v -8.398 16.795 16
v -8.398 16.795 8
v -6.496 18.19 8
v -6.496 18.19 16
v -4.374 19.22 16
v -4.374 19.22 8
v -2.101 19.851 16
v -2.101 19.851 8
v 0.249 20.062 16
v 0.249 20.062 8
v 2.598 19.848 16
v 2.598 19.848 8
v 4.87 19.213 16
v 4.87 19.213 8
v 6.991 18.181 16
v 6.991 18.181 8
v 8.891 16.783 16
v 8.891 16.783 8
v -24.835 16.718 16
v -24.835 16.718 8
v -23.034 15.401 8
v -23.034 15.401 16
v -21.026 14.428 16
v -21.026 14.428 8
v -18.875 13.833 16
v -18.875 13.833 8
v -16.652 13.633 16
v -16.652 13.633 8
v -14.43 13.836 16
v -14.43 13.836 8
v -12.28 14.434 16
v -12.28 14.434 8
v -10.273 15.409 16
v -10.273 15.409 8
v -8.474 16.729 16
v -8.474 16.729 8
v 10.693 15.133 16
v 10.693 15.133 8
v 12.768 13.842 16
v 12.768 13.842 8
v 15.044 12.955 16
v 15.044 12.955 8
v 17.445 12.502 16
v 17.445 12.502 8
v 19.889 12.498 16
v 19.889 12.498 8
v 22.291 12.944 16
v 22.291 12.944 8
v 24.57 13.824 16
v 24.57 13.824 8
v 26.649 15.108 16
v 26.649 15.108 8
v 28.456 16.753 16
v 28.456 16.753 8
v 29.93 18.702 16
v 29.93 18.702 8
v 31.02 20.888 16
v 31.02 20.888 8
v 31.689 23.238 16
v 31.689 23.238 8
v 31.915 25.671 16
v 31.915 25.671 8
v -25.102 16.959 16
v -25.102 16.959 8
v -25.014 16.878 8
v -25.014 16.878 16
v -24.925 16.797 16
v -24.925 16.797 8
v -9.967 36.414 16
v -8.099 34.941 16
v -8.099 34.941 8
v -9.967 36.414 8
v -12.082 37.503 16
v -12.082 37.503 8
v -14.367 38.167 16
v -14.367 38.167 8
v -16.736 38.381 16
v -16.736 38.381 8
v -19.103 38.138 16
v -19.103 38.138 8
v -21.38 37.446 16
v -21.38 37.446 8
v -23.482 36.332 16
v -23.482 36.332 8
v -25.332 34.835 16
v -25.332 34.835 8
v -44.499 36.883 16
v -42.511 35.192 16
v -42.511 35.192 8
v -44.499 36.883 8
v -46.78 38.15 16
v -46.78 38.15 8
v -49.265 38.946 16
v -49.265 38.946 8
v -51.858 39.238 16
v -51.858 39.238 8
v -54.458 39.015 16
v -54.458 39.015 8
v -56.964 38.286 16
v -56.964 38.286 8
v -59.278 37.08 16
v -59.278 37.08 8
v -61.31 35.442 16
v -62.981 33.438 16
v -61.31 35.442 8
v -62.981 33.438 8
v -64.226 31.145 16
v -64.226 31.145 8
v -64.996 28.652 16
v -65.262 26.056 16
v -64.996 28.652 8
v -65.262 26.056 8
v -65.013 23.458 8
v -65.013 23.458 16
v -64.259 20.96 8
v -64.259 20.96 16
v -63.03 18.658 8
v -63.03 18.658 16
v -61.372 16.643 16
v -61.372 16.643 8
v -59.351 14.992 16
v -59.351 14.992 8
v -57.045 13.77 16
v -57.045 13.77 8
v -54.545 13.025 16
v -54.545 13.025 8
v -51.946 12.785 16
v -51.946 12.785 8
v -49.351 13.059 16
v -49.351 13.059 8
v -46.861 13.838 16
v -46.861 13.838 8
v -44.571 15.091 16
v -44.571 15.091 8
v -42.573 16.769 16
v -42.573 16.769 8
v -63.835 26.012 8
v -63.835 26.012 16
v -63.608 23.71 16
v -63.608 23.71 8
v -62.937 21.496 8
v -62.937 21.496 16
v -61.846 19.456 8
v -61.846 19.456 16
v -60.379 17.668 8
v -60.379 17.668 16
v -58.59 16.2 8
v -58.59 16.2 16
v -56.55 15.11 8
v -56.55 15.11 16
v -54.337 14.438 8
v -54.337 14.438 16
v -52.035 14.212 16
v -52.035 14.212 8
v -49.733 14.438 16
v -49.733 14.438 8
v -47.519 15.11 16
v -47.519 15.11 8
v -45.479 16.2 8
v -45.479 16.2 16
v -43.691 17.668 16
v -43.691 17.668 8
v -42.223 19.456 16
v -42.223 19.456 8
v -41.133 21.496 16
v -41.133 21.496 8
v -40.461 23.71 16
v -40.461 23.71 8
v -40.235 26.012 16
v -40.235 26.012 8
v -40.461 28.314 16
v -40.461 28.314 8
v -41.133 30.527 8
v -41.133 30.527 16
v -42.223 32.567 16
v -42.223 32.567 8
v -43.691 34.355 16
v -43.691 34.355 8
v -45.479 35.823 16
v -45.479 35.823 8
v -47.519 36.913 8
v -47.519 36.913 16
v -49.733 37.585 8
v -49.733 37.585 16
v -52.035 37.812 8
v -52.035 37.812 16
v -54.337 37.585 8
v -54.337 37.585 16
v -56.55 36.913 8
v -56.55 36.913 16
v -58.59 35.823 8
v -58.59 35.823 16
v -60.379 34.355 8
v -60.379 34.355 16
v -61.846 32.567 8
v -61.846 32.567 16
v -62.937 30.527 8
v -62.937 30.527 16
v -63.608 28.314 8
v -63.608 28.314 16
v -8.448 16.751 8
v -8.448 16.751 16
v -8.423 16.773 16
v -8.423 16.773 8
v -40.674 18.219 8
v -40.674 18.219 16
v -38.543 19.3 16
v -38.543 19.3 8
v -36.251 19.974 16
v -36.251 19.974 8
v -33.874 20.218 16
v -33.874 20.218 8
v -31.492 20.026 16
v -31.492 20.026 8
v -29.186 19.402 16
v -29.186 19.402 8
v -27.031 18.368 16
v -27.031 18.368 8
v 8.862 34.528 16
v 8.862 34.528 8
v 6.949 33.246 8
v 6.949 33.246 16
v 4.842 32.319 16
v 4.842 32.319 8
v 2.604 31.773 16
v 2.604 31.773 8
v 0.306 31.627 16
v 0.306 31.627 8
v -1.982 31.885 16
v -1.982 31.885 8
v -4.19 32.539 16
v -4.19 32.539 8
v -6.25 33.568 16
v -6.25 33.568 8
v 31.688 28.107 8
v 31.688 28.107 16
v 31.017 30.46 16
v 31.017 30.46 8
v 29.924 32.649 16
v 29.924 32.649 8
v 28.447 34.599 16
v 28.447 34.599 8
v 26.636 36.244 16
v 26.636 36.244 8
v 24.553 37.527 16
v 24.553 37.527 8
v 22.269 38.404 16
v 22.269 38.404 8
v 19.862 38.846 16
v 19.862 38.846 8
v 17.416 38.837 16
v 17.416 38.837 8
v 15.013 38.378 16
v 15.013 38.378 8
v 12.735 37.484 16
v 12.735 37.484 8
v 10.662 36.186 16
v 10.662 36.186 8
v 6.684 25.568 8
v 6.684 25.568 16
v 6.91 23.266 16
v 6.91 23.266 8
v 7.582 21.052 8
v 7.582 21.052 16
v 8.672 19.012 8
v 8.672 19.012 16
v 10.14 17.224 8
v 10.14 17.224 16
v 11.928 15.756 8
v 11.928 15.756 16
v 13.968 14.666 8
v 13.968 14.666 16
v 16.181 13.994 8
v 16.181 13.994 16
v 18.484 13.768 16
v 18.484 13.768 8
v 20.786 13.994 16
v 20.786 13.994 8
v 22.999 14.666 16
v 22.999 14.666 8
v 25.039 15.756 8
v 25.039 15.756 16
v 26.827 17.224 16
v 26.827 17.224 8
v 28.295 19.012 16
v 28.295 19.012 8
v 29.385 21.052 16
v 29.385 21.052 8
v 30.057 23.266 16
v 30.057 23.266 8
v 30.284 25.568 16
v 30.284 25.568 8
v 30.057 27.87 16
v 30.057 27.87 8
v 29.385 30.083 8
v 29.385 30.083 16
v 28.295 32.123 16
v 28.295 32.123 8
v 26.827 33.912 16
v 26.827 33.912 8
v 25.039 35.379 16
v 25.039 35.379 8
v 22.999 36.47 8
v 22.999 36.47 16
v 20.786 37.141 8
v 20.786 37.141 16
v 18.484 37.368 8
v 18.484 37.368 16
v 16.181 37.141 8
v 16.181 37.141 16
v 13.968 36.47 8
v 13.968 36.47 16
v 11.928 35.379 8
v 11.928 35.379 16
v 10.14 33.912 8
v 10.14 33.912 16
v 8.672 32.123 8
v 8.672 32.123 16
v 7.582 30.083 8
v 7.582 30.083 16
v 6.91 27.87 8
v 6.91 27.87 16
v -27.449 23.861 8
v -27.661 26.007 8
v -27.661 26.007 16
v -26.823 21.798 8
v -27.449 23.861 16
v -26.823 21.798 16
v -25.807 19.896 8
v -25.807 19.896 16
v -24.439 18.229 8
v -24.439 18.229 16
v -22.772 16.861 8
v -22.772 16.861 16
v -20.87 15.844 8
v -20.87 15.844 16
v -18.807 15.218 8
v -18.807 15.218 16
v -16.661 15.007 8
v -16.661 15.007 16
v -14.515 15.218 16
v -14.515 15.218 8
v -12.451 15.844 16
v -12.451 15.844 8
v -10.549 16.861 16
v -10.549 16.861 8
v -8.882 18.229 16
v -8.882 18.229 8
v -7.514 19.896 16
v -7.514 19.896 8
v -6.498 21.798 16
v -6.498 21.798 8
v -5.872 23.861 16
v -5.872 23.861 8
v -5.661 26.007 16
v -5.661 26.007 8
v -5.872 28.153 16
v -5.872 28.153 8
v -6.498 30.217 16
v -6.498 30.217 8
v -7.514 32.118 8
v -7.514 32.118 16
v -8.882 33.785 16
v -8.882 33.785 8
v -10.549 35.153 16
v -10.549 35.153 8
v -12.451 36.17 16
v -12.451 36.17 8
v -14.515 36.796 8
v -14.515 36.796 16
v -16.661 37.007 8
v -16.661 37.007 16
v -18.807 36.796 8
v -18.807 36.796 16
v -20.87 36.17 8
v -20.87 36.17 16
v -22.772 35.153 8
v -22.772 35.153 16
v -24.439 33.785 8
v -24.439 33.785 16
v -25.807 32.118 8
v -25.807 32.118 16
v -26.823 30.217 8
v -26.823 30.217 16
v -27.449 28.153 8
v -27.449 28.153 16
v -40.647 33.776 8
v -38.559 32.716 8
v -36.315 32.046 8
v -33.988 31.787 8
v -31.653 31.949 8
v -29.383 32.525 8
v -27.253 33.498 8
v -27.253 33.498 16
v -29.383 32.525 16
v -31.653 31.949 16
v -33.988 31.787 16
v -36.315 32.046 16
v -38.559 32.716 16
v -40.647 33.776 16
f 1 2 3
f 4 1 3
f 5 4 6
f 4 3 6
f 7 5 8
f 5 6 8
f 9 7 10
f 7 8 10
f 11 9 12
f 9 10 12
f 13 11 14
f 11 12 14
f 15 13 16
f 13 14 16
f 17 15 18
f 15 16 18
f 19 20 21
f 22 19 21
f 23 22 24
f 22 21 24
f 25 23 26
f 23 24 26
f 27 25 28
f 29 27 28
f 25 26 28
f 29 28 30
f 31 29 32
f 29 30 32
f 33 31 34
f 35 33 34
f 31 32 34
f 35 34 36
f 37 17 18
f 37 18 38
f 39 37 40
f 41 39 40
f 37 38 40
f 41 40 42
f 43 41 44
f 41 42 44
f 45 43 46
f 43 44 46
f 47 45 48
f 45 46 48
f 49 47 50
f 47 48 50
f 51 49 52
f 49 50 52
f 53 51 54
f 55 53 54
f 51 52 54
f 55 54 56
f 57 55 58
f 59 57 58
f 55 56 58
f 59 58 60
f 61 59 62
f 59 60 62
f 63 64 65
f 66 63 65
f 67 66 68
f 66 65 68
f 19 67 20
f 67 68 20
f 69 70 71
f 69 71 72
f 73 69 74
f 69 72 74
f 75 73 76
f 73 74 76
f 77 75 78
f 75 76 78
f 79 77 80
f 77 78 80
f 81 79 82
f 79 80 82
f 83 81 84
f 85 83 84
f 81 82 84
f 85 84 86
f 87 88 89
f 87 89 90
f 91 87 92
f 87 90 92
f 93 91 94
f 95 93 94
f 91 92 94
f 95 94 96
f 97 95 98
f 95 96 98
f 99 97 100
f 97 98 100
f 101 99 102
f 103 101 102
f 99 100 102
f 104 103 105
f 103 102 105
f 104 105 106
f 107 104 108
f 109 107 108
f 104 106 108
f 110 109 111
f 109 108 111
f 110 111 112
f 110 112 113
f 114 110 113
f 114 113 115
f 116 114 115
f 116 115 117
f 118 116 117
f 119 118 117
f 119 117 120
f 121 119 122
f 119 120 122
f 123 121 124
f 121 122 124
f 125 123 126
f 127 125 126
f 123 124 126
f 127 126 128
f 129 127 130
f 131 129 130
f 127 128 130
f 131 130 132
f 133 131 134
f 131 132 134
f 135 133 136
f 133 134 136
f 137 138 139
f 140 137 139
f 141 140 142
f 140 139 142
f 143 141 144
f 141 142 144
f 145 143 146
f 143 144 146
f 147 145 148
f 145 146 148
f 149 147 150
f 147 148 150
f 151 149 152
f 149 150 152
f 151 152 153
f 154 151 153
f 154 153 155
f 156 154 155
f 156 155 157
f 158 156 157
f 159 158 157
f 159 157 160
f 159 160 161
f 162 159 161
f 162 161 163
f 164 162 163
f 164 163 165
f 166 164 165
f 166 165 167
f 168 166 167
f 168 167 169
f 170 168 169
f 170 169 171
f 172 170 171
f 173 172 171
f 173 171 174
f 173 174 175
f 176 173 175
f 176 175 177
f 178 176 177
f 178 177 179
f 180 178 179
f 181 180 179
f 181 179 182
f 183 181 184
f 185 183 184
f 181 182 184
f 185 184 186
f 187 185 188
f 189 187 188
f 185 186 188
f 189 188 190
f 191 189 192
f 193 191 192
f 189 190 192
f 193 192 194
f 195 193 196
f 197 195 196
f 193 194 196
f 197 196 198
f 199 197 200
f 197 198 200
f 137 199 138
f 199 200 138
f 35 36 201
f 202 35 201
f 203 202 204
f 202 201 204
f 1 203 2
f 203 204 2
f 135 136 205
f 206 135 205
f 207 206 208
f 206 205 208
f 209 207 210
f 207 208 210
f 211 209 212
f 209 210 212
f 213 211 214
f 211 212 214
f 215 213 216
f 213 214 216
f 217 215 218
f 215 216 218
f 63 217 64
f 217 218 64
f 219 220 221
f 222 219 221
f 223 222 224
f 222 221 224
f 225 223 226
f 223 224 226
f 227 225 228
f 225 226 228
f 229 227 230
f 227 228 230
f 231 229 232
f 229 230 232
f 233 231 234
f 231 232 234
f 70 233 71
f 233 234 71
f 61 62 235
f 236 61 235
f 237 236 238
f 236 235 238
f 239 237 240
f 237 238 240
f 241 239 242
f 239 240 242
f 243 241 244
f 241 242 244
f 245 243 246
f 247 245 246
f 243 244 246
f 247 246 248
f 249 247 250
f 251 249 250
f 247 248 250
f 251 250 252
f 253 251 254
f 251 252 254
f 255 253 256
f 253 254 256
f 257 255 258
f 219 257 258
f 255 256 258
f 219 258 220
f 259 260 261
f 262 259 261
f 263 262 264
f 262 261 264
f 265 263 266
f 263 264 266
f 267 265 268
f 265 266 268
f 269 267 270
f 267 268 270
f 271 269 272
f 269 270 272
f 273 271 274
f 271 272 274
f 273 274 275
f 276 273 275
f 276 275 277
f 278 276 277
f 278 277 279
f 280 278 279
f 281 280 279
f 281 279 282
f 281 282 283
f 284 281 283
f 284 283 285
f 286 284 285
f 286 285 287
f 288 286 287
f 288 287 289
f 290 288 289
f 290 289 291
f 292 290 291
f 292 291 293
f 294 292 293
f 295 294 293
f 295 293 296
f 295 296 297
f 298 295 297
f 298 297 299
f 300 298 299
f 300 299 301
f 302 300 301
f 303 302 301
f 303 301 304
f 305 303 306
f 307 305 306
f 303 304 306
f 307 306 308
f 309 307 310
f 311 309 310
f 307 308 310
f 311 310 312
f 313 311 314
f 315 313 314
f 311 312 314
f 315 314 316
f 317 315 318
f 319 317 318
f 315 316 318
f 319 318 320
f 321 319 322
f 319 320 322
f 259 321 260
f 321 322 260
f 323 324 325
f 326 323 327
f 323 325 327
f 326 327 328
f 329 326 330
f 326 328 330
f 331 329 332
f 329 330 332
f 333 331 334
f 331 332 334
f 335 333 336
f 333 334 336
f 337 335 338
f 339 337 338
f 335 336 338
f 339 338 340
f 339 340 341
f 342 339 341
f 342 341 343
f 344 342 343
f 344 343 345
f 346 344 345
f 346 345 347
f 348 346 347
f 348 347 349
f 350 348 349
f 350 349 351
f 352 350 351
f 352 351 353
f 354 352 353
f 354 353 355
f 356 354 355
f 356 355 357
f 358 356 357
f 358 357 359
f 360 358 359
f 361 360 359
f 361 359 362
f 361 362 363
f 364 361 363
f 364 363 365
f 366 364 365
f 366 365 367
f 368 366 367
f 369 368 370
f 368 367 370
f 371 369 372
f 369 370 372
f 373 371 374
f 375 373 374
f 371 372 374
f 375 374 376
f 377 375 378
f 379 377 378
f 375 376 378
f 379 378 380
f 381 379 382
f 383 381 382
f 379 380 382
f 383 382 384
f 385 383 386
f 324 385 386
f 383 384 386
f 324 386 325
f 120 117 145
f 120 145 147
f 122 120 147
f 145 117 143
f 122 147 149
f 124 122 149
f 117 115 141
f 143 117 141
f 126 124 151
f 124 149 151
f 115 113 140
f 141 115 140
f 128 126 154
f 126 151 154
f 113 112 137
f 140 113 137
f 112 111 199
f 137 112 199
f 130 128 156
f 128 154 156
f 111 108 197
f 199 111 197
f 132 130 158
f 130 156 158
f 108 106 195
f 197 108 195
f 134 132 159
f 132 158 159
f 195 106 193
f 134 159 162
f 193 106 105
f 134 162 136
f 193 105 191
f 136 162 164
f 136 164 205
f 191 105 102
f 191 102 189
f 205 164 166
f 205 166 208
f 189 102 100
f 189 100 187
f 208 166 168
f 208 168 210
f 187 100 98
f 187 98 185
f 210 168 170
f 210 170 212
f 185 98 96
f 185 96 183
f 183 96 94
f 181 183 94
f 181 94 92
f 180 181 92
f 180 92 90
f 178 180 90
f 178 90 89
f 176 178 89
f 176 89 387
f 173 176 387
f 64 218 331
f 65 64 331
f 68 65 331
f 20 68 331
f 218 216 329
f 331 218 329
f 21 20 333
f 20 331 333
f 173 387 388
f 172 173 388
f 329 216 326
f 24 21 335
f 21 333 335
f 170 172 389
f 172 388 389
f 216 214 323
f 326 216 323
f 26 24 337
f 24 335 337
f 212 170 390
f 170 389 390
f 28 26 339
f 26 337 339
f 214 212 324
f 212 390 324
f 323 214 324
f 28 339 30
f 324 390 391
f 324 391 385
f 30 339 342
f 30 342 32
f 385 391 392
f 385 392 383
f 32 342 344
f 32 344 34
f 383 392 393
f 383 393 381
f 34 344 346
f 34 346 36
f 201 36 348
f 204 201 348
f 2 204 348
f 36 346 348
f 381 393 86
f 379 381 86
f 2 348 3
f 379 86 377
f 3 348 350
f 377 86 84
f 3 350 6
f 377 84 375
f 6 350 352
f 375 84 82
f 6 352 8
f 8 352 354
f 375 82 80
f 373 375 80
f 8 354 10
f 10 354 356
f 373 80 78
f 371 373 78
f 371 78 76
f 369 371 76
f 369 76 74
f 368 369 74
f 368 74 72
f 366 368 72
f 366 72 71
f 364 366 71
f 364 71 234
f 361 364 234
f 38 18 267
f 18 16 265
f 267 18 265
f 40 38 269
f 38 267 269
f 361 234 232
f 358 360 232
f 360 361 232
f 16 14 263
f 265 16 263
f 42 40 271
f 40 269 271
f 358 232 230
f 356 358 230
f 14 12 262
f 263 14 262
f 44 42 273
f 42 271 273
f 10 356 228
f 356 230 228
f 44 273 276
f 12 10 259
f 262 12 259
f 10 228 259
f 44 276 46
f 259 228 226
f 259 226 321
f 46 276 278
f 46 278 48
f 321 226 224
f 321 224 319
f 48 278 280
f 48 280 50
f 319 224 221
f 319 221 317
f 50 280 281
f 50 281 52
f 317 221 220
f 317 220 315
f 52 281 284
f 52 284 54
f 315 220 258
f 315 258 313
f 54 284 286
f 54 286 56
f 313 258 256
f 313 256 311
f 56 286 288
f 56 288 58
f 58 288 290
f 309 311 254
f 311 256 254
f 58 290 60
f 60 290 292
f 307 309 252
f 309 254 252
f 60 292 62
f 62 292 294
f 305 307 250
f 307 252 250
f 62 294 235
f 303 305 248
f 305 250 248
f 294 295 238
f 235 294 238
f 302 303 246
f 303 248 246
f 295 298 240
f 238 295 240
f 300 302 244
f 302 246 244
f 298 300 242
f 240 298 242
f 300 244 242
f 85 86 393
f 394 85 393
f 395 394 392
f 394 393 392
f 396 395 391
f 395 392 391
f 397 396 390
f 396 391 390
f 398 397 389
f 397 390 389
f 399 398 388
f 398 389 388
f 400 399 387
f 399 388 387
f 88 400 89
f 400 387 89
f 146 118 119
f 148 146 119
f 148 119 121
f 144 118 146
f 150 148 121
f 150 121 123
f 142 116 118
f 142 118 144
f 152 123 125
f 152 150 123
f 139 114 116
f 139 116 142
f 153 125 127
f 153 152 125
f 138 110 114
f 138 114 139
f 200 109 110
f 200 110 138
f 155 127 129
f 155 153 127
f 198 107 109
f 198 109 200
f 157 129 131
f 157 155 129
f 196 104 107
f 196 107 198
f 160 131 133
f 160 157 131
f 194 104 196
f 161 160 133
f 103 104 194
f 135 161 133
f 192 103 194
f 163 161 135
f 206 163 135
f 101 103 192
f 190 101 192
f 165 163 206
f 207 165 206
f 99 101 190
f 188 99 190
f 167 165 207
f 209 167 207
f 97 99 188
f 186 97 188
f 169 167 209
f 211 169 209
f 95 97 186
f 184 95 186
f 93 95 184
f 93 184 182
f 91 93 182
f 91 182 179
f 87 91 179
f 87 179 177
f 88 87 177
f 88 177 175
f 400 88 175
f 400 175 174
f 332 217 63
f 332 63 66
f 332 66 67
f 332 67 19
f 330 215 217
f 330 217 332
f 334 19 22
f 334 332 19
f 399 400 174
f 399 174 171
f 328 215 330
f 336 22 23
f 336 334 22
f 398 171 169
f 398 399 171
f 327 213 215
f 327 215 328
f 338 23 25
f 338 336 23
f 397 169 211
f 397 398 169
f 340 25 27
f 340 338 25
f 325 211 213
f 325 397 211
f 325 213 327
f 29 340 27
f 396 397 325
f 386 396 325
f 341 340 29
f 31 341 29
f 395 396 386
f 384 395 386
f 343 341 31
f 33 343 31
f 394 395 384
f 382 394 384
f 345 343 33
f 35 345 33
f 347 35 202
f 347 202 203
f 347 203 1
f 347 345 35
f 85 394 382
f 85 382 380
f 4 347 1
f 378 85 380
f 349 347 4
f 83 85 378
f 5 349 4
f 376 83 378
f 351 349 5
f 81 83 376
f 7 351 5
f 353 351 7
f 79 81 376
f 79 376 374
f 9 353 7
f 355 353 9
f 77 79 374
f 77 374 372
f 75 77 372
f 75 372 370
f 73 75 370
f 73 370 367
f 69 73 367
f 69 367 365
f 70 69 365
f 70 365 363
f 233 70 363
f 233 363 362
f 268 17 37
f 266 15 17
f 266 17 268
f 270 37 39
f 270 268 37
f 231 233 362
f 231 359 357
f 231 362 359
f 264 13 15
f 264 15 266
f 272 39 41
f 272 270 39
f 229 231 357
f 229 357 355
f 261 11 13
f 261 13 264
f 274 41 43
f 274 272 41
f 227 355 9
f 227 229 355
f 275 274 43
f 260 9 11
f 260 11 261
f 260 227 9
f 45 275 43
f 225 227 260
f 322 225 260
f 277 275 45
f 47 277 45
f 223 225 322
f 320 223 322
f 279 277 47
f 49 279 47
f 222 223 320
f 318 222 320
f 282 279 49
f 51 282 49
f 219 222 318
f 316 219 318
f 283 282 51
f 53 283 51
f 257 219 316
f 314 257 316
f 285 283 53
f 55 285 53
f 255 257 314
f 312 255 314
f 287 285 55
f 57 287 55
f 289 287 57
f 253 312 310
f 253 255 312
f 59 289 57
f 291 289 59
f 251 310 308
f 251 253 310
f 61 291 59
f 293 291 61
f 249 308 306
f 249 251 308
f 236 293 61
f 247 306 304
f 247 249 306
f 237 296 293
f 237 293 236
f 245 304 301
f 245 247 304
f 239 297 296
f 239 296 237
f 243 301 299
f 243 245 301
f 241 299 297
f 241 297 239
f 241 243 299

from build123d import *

# Parameters (mm, degrees)
F1_DEPTH = 8
F3_DEPTH = 8
F4_D     = 23.6
F5_D     = 22


# Not quite as in the source:
# - a feature names something its author has since deleted; it is built from what else it names


with BuildPart() as f1:
    # F0 (on Top) → F1 (new body)
    with BuildSketch(Plane.XY):
        with BuildLine():
            ThreePointArc((30.2364596242, 25.5677551031), (18.556965651, 37.3204786398), (6.7314716859, 25.7146705041))
            ThreePointArc((6.7314716859, 25.7146705041), (18.4100473802, 13.8150315665), (30.2364596242, 25.5677551031))
        make_face()
    extrude(amount=F1_DEPTH)

    # F2 (on face) → F3 (join)
    with BuildSketch(Plane.XY.offset(8)):
        with BuildLine():
            ThreePointArc((-42.5114348153, 35.1915450581), (-65.2620832709, 26.0556201481), (-42.5726949965, 16.7685975444))
            ThreePointArc((-42.5726949965, 16.7685975444), (-39.7847972392, 21.021355147), (-38.8073447634, 26.0116364807))
            ThreePointArc((-38.8073447634, 26.0116364807), (-39.7682713179, 30.9611567757), (-42.5114348153, 35.1915450581))
        make_face()
        with BuildLine():
            ThreePointArc((-38.8073447634, 26.0116364807), (-39.7847972392, 21.021355147), (-42.5726949965, 16.7685975444))
            ThreePointArc((-42.5726949965, 16.7685975444), (-33.87370444, 20.218317429), (-25.1016516698, 16.9588551759))
            ThreePointArc((-25.1016516698, 16.9588551759), (-29.0338445102, 25.8480071098), (-25.3315074449, 34.8353238892))
            ThreePointArc((-25.3315074449, 34.8353238892), (-33.9883630197, 31.7873549926), (-42.5114348153, 35.1915450581))
            ThreePointArc((-42.5114348153, 35.1915450581), (-39.7682713179, 30.9611567757), (-38.8073447634, 26.0116364807))
        make_face()
        with BuildLine():
            ThreePointArc((-24.8354704192, 16.7176675443), (-24.9677312973, 16.8391770918), (-25.1016516698, 16.9588551759))
            ThreePointArc((-25.1016516698, 16.9588551759), (-24.9694362403, 16.8372954701), (-24.8354704192, 16.7176675443))
        make_face()
        with BuildLine():
            ThreePointArc((-25.3315074449, 34.8353238892), (-29.0338445102, 25.8480071098), (-25.1016516698, 16.9588551759))
            ThreePointArc((-25.1016516698, 16.9588551759), (-24.9677312973, 16.8391770918), (-24.8354704192, 16.7176675443))
            ThreePointArc((-24.8354704192, 16.7176675443), (-16.6524528686, 13.6328843719), (-8.4735280262, 16.7285025458))
            ThreePointArc((-8.4735280262, 16.7285025458), (-8.4359829057, 16.7620336333), (-8.3983087423, 16.7954196681))
            ThreePointArc((-8.3983087423, 16.7954196681), (-5.3610604956, 20.9632278118), (-4.2864270488, 26.0071017784))
            ThreePointArc((-4.2864270488, 26.0071017784), (-5.2792843636, 30.8636339026), (-8.098530607, 34.9408290832))
            ThreePointArc((-8.098530607, 34.9408290832), (-16.7364042498, 38.381089997), (-25.3315074449, 34.8353238892))
        make_face()
        with BuildLine():
            ThreePointArc((8.8624930635, 34.5276918287), (0.3063045577, 31.6274145181), (-8.098530607, 34.9408290832))
            ThreePointArc((-8.098530607, 34.9408290832), (-5.2792843636, 30.8636339026), (-4.2864270488, 26.0071017784))
            ThreePointArc((-4.2864270488, 26.0071017784), (-5.3610604956, 20.9632278118), (-8.3983087423, 16.7954196681))
            ThreePointArc((-8.3983087423, 16.7954196681), (0.2487240262, 20.0624034029), (8.8910160496, 16.7828993238))
            ThreePointArc((8.8910160496, 16.7828993238), (5.4597887201, 25.6498031441), (8.8624930635, 34.5276918287))
        make_face()
        with BuildLine():
            ThreePointArc((-8.3983087423, 16.7954196681), (-8.4359829057, 16.7620336333), (-8.4735280262, 16.7285025458))
            ThreePointArc((-8.4735280262, 16.7285025458), (-8.4358503291, 16.7618846084), (-8.3983087423, 16.7954196681))
        make_face()
        with BuildLine():
            ThreePointArc((31.9145832669, 25.6710648537), (23.431077599, 38.0185211111), (8.8624930635, 34.5276918287))
            ThreePointArc((8.8624930635, 34.5276918287), (5.4597887201, 25.6498031441), (8.8910160496, 16.7828993238))
            ThreePointArc((8.8910160496, 16.7828993238), (23.4509187507, 13.3312498845), (31.9145832669, 25.6710648537))
        make_face()
    extrude(amount=F3_DEPTH)

    # F4 (through all)
    with Locations(Plane(origin=(0, 0, 0), x_dir=(1, 0, 0), z_dir=(0, 0, -1))):
        with Locations((-52.0347505808, -26.0116364807), (18.4835065156, -25.5677551031)):
            Hole(F4_D / 2)

    # F5 (through all)
    with Locations(Plane(origin=(0, 0, 0), x_dir=(1, 0, 0), z_dir=(0, 0, -1))):
        with Locations((-16.6606471685, -26.0071017784)):
            Hole(F5_D / 2)


solid = f1.part
